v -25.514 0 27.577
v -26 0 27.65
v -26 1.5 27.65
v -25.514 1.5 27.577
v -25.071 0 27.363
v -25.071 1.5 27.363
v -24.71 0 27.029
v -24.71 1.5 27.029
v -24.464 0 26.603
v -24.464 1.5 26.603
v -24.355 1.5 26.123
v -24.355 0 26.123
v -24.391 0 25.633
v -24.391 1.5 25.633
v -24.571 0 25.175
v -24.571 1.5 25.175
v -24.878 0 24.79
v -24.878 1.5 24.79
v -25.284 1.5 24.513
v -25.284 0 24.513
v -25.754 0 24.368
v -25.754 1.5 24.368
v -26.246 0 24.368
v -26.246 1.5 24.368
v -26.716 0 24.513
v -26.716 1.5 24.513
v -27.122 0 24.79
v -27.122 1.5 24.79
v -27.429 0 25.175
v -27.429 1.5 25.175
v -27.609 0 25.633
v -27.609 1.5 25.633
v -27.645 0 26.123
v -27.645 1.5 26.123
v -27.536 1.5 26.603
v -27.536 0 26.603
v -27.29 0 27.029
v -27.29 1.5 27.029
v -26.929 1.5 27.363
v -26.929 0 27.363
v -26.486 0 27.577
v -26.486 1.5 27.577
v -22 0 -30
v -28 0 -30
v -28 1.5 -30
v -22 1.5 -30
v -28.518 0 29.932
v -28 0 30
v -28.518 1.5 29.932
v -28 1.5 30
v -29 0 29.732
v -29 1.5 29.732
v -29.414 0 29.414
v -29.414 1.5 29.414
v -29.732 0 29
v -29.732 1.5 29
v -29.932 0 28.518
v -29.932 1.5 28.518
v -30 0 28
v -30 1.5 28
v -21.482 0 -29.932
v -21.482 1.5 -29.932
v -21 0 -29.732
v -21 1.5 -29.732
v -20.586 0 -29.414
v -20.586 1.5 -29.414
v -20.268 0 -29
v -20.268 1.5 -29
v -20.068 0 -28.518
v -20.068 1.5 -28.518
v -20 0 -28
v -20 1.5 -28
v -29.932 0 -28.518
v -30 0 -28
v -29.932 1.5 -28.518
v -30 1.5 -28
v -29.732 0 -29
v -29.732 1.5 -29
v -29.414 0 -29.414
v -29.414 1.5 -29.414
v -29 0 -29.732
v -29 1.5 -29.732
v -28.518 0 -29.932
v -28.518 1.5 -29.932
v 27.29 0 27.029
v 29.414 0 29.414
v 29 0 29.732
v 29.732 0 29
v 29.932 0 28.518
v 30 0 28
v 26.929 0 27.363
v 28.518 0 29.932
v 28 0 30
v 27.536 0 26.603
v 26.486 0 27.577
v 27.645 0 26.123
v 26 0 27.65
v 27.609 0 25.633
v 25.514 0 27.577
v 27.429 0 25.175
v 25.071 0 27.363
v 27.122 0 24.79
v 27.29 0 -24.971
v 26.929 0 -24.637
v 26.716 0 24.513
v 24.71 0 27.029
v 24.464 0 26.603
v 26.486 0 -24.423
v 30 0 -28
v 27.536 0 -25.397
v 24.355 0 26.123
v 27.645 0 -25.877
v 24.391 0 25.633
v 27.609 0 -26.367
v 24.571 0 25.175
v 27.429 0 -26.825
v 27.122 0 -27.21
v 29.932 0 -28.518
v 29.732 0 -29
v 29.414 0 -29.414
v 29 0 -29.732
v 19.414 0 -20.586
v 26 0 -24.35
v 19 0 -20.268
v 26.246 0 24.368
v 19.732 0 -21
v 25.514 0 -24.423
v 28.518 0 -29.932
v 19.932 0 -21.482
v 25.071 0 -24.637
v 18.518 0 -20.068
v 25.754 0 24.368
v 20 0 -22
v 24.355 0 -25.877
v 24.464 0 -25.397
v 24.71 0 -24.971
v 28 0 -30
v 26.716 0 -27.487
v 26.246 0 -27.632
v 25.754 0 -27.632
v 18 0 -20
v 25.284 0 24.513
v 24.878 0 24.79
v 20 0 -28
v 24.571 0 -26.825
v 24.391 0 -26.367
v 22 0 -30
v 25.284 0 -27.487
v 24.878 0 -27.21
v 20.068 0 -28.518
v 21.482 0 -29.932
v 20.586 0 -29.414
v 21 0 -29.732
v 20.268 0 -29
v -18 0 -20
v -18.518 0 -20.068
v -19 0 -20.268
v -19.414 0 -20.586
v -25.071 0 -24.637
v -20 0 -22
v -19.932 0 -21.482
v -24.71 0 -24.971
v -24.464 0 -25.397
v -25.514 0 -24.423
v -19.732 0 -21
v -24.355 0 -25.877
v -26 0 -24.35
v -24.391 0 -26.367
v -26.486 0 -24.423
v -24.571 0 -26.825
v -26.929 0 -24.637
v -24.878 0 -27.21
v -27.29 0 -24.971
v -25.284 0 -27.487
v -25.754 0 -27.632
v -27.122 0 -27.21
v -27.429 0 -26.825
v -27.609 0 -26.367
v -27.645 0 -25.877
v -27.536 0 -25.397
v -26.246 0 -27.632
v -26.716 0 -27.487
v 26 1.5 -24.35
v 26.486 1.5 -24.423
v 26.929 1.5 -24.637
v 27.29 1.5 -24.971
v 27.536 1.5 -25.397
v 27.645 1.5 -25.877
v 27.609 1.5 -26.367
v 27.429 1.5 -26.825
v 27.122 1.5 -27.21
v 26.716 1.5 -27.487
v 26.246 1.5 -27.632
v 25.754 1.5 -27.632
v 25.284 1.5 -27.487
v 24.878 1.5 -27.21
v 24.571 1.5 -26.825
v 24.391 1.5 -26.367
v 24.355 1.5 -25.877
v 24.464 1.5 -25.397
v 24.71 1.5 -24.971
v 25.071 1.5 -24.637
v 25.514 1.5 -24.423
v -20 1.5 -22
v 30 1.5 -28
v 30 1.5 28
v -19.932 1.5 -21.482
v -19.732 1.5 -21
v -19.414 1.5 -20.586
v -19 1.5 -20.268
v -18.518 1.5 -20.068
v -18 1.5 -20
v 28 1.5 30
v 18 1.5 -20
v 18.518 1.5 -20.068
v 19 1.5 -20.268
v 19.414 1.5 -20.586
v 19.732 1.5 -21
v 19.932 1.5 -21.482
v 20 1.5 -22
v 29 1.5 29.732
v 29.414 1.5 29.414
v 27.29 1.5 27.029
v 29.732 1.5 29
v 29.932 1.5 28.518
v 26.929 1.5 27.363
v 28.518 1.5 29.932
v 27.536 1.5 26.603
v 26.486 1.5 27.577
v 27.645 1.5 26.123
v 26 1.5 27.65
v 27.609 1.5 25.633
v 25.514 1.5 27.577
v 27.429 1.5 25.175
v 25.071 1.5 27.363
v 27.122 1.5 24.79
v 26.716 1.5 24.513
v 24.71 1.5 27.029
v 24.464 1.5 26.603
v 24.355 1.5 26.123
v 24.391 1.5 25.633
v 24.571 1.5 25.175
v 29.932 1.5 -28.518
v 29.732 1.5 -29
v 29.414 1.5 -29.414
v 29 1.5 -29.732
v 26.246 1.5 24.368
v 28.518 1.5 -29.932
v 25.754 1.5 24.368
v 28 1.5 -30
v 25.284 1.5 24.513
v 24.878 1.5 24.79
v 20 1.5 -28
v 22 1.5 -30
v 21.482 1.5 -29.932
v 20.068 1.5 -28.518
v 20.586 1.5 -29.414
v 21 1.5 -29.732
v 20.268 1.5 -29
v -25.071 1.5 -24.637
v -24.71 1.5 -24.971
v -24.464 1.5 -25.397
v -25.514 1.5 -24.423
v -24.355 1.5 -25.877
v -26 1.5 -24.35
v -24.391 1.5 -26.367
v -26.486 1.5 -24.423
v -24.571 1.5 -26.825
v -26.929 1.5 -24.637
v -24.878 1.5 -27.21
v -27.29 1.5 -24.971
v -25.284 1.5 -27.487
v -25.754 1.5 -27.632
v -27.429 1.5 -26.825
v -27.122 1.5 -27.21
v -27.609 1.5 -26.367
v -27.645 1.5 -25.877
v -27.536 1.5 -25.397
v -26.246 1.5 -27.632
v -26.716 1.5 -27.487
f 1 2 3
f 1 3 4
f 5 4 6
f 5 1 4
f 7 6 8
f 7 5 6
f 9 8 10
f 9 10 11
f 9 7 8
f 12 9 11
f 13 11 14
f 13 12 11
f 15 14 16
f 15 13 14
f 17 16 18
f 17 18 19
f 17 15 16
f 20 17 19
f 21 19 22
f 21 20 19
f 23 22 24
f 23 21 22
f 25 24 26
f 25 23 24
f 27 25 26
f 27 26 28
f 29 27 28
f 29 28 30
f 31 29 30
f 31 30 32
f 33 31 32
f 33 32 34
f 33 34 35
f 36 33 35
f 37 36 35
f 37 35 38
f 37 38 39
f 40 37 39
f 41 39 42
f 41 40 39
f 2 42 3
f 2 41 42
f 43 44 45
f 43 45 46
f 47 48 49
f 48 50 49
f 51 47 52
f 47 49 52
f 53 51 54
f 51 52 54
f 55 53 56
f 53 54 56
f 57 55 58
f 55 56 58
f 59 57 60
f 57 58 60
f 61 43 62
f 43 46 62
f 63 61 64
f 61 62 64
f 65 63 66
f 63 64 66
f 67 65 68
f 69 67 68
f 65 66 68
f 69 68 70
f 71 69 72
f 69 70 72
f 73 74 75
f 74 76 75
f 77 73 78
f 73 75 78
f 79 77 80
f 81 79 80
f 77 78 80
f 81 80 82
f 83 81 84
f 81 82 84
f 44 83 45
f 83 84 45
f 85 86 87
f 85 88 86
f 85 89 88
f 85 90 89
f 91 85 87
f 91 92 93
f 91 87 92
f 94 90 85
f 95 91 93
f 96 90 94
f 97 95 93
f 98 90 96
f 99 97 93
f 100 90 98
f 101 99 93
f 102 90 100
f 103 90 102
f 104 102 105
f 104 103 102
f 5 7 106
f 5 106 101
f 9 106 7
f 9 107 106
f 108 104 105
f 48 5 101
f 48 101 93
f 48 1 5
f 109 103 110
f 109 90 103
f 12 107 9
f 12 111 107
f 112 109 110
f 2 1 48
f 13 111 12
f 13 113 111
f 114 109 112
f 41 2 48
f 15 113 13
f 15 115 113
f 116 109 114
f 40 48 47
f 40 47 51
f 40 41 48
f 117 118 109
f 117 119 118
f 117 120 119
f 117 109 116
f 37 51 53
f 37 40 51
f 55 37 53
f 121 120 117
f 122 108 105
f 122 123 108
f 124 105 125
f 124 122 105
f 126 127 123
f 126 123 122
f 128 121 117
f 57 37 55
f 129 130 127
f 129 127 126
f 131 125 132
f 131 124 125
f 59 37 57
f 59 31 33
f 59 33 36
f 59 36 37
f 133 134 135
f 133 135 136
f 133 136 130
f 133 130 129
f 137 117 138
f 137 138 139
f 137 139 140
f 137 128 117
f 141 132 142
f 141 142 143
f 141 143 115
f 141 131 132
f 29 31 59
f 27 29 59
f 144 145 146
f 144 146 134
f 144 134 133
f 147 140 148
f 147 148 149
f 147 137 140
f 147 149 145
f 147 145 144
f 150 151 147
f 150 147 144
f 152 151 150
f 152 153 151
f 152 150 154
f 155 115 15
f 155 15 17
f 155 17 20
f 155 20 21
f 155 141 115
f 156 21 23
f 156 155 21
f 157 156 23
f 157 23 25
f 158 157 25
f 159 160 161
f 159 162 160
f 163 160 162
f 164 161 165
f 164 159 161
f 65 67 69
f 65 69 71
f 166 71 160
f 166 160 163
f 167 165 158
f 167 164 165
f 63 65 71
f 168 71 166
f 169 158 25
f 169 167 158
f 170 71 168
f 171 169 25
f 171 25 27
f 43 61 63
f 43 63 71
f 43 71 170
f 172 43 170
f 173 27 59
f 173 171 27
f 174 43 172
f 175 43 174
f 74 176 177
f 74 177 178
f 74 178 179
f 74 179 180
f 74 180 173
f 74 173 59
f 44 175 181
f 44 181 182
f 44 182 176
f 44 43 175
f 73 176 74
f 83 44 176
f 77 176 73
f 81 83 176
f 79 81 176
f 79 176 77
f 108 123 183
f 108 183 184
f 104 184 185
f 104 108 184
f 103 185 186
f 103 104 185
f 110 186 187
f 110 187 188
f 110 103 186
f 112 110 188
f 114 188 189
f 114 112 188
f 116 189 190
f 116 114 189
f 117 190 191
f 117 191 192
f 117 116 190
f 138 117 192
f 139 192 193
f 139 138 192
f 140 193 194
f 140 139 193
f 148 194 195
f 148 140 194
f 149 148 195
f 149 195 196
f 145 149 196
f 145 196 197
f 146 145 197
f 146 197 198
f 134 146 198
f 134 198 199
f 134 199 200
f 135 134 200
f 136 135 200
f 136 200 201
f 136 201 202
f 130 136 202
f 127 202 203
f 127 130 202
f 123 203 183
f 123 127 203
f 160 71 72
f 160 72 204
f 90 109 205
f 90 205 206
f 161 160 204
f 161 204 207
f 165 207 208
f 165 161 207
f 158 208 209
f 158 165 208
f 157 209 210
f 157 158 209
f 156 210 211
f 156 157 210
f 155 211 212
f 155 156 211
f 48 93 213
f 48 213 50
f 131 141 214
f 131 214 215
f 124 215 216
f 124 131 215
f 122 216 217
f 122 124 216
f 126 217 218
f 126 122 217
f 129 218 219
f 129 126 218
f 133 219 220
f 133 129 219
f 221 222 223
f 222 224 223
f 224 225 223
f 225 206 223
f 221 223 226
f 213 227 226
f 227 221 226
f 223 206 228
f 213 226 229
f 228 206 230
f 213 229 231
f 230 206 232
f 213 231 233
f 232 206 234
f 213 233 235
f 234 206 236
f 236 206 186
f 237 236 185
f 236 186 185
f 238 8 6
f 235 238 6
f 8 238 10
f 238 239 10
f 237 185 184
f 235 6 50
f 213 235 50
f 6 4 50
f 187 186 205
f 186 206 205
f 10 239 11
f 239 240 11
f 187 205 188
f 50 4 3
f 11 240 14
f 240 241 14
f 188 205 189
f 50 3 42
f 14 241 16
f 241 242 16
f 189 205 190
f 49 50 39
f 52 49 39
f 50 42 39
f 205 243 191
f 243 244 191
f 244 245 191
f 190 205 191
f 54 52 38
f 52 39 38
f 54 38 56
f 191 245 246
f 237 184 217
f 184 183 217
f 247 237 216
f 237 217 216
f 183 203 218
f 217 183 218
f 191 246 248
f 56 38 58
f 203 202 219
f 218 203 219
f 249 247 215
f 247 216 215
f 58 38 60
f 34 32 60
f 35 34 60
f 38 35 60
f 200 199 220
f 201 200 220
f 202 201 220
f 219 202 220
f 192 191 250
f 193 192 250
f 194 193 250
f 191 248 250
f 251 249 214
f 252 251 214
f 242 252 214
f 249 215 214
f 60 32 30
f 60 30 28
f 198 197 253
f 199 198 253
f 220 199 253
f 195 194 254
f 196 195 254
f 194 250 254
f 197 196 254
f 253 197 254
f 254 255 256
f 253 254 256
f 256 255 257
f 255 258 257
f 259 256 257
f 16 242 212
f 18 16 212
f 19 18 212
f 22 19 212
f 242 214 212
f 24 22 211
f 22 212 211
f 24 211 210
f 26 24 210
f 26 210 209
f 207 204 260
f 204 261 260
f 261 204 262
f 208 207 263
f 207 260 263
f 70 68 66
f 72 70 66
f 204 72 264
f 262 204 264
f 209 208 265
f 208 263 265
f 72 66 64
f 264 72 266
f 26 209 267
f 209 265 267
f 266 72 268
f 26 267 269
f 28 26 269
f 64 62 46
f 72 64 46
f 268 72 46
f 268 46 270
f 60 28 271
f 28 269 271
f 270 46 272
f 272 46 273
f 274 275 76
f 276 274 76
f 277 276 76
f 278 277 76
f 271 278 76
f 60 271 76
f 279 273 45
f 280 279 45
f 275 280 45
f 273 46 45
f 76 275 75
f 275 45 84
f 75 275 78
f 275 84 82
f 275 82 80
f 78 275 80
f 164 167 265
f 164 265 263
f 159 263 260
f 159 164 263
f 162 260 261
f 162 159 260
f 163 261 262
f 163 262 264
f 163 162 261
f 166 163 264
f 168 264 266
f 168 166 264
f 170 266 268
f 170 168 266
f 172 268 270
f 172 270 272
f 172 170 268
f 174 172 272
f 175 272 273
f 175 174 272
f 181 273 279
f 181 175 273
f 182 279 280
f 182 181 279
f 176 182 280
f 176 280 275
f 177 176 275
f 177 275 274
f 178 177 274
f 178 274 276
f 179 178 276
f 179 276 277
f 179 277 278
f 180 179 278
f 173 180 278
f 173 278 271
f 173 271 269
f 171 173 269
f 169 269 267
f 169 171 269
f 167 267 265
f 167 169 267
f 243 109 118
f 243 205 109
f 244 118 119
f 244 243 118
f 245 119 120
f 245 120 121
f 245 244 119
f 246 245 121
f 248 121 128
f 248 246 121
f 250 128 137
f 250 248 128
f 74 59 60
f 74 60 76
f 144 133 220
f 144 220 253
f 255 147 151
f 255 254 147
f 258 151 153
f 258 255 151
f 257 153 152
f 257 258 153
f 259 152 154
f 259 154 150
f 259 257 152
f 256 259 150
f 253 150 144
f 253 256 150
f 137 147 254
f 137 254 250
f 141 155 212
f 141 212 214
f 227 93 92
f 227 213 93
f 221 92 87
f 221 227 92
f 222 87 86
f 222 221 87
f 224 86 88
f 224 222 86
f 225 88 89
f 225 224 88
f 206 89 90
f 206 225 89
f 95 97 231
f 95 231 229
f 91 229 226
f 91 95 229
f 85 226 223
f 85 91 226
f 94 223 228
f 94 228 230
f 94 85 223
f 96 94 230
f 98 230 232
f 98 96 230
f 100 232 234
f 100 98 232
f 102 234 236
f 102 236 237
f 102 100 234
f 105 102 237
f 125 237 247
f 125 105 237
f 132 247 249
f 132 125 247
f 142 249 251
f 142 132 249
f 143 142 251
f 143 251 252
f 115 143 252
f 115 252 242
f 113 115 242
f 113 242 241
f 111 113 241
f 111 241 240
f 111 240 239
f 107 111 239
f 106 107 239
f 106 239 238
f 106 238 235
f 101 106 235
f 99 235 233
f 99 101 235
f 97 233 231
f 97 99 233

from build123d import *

# Parameters (mm, degrees)
SKETCH_1_R      = 1.65
EXTRUDE_1_DEPTH = 1.5
FILLET_1_R      = 2
FILLET_2_R      = 2


with BuildPart() as part:
    # Эскиз1 → Бобышка-Вытянуть1 (new body)
    with BuildSketch(Plane(origin=(0, 0, 0), x_dir=(1, 0, 0), z_dir=(0, 1, 0))):
        with BuildLine():
            Line((20, 30), (30, 30))
            Line((30, 30), (30, -30))
            Line((30, -30), (-30, -30))
            Line((-30, -30), (-30, 30))
            Line((-30, 30), (-20, 30))
            Line((-20, 30), (-20, 22))
            ThreePointArc((-20, 22), (-19.414213562, 20.585786438), (-18, 20))
            Line((-18, 20), (18, 20))
            ThreePointArc((18, 20), (19.414213562, 20.585786438), (20, 22))
            Line((20, 22), (20, 30))
        make_face()
        with Locations(Location((-26, 26, 0), (0, 0, 270))):
            Circle(SKETCH_1_R, mode=Mode.SUBTRACT)
        with Locations(Location((26, 26, 0), (0, 0, 270))):
            Circle(SKETCH_1_R, mode=Mode.SUBTRACT)
        with Locations(Location((-26, -26, 0), (0, 0, 270))):
            Circle(SKETCH_1_R, mode=Mode.SUBTRACT)
        with Locations(Location((26, -26, 0), (0, 0, 270))):
            Circle(SKETCH_1_R, mode=Mode.SUBTRACT)
    extrude(amount=EXTRUDE_1_DEPTH)

    # Скругление1
    fillet_1_edges = [part.edges().sort_by_distance(p)[0] for p in [
        (-30, 0.75, 30),
    ]]
    fillet(fillet_1_edges, radius=FILLET_1_R)

    # Скругление2
    fillet_2_edges = [part.edges().sort_by_distance(p)[0] for p in [
        (-30, 0.75, -30),
        (-20, 0.75, -30),
        (20, 0.75, -30),
        (30, 0.75, -30),
        (30, 0.75, 30),
    ]]
    fillet(fillet_2_edges, radius=FILLET_2_R)


solid = part.part
